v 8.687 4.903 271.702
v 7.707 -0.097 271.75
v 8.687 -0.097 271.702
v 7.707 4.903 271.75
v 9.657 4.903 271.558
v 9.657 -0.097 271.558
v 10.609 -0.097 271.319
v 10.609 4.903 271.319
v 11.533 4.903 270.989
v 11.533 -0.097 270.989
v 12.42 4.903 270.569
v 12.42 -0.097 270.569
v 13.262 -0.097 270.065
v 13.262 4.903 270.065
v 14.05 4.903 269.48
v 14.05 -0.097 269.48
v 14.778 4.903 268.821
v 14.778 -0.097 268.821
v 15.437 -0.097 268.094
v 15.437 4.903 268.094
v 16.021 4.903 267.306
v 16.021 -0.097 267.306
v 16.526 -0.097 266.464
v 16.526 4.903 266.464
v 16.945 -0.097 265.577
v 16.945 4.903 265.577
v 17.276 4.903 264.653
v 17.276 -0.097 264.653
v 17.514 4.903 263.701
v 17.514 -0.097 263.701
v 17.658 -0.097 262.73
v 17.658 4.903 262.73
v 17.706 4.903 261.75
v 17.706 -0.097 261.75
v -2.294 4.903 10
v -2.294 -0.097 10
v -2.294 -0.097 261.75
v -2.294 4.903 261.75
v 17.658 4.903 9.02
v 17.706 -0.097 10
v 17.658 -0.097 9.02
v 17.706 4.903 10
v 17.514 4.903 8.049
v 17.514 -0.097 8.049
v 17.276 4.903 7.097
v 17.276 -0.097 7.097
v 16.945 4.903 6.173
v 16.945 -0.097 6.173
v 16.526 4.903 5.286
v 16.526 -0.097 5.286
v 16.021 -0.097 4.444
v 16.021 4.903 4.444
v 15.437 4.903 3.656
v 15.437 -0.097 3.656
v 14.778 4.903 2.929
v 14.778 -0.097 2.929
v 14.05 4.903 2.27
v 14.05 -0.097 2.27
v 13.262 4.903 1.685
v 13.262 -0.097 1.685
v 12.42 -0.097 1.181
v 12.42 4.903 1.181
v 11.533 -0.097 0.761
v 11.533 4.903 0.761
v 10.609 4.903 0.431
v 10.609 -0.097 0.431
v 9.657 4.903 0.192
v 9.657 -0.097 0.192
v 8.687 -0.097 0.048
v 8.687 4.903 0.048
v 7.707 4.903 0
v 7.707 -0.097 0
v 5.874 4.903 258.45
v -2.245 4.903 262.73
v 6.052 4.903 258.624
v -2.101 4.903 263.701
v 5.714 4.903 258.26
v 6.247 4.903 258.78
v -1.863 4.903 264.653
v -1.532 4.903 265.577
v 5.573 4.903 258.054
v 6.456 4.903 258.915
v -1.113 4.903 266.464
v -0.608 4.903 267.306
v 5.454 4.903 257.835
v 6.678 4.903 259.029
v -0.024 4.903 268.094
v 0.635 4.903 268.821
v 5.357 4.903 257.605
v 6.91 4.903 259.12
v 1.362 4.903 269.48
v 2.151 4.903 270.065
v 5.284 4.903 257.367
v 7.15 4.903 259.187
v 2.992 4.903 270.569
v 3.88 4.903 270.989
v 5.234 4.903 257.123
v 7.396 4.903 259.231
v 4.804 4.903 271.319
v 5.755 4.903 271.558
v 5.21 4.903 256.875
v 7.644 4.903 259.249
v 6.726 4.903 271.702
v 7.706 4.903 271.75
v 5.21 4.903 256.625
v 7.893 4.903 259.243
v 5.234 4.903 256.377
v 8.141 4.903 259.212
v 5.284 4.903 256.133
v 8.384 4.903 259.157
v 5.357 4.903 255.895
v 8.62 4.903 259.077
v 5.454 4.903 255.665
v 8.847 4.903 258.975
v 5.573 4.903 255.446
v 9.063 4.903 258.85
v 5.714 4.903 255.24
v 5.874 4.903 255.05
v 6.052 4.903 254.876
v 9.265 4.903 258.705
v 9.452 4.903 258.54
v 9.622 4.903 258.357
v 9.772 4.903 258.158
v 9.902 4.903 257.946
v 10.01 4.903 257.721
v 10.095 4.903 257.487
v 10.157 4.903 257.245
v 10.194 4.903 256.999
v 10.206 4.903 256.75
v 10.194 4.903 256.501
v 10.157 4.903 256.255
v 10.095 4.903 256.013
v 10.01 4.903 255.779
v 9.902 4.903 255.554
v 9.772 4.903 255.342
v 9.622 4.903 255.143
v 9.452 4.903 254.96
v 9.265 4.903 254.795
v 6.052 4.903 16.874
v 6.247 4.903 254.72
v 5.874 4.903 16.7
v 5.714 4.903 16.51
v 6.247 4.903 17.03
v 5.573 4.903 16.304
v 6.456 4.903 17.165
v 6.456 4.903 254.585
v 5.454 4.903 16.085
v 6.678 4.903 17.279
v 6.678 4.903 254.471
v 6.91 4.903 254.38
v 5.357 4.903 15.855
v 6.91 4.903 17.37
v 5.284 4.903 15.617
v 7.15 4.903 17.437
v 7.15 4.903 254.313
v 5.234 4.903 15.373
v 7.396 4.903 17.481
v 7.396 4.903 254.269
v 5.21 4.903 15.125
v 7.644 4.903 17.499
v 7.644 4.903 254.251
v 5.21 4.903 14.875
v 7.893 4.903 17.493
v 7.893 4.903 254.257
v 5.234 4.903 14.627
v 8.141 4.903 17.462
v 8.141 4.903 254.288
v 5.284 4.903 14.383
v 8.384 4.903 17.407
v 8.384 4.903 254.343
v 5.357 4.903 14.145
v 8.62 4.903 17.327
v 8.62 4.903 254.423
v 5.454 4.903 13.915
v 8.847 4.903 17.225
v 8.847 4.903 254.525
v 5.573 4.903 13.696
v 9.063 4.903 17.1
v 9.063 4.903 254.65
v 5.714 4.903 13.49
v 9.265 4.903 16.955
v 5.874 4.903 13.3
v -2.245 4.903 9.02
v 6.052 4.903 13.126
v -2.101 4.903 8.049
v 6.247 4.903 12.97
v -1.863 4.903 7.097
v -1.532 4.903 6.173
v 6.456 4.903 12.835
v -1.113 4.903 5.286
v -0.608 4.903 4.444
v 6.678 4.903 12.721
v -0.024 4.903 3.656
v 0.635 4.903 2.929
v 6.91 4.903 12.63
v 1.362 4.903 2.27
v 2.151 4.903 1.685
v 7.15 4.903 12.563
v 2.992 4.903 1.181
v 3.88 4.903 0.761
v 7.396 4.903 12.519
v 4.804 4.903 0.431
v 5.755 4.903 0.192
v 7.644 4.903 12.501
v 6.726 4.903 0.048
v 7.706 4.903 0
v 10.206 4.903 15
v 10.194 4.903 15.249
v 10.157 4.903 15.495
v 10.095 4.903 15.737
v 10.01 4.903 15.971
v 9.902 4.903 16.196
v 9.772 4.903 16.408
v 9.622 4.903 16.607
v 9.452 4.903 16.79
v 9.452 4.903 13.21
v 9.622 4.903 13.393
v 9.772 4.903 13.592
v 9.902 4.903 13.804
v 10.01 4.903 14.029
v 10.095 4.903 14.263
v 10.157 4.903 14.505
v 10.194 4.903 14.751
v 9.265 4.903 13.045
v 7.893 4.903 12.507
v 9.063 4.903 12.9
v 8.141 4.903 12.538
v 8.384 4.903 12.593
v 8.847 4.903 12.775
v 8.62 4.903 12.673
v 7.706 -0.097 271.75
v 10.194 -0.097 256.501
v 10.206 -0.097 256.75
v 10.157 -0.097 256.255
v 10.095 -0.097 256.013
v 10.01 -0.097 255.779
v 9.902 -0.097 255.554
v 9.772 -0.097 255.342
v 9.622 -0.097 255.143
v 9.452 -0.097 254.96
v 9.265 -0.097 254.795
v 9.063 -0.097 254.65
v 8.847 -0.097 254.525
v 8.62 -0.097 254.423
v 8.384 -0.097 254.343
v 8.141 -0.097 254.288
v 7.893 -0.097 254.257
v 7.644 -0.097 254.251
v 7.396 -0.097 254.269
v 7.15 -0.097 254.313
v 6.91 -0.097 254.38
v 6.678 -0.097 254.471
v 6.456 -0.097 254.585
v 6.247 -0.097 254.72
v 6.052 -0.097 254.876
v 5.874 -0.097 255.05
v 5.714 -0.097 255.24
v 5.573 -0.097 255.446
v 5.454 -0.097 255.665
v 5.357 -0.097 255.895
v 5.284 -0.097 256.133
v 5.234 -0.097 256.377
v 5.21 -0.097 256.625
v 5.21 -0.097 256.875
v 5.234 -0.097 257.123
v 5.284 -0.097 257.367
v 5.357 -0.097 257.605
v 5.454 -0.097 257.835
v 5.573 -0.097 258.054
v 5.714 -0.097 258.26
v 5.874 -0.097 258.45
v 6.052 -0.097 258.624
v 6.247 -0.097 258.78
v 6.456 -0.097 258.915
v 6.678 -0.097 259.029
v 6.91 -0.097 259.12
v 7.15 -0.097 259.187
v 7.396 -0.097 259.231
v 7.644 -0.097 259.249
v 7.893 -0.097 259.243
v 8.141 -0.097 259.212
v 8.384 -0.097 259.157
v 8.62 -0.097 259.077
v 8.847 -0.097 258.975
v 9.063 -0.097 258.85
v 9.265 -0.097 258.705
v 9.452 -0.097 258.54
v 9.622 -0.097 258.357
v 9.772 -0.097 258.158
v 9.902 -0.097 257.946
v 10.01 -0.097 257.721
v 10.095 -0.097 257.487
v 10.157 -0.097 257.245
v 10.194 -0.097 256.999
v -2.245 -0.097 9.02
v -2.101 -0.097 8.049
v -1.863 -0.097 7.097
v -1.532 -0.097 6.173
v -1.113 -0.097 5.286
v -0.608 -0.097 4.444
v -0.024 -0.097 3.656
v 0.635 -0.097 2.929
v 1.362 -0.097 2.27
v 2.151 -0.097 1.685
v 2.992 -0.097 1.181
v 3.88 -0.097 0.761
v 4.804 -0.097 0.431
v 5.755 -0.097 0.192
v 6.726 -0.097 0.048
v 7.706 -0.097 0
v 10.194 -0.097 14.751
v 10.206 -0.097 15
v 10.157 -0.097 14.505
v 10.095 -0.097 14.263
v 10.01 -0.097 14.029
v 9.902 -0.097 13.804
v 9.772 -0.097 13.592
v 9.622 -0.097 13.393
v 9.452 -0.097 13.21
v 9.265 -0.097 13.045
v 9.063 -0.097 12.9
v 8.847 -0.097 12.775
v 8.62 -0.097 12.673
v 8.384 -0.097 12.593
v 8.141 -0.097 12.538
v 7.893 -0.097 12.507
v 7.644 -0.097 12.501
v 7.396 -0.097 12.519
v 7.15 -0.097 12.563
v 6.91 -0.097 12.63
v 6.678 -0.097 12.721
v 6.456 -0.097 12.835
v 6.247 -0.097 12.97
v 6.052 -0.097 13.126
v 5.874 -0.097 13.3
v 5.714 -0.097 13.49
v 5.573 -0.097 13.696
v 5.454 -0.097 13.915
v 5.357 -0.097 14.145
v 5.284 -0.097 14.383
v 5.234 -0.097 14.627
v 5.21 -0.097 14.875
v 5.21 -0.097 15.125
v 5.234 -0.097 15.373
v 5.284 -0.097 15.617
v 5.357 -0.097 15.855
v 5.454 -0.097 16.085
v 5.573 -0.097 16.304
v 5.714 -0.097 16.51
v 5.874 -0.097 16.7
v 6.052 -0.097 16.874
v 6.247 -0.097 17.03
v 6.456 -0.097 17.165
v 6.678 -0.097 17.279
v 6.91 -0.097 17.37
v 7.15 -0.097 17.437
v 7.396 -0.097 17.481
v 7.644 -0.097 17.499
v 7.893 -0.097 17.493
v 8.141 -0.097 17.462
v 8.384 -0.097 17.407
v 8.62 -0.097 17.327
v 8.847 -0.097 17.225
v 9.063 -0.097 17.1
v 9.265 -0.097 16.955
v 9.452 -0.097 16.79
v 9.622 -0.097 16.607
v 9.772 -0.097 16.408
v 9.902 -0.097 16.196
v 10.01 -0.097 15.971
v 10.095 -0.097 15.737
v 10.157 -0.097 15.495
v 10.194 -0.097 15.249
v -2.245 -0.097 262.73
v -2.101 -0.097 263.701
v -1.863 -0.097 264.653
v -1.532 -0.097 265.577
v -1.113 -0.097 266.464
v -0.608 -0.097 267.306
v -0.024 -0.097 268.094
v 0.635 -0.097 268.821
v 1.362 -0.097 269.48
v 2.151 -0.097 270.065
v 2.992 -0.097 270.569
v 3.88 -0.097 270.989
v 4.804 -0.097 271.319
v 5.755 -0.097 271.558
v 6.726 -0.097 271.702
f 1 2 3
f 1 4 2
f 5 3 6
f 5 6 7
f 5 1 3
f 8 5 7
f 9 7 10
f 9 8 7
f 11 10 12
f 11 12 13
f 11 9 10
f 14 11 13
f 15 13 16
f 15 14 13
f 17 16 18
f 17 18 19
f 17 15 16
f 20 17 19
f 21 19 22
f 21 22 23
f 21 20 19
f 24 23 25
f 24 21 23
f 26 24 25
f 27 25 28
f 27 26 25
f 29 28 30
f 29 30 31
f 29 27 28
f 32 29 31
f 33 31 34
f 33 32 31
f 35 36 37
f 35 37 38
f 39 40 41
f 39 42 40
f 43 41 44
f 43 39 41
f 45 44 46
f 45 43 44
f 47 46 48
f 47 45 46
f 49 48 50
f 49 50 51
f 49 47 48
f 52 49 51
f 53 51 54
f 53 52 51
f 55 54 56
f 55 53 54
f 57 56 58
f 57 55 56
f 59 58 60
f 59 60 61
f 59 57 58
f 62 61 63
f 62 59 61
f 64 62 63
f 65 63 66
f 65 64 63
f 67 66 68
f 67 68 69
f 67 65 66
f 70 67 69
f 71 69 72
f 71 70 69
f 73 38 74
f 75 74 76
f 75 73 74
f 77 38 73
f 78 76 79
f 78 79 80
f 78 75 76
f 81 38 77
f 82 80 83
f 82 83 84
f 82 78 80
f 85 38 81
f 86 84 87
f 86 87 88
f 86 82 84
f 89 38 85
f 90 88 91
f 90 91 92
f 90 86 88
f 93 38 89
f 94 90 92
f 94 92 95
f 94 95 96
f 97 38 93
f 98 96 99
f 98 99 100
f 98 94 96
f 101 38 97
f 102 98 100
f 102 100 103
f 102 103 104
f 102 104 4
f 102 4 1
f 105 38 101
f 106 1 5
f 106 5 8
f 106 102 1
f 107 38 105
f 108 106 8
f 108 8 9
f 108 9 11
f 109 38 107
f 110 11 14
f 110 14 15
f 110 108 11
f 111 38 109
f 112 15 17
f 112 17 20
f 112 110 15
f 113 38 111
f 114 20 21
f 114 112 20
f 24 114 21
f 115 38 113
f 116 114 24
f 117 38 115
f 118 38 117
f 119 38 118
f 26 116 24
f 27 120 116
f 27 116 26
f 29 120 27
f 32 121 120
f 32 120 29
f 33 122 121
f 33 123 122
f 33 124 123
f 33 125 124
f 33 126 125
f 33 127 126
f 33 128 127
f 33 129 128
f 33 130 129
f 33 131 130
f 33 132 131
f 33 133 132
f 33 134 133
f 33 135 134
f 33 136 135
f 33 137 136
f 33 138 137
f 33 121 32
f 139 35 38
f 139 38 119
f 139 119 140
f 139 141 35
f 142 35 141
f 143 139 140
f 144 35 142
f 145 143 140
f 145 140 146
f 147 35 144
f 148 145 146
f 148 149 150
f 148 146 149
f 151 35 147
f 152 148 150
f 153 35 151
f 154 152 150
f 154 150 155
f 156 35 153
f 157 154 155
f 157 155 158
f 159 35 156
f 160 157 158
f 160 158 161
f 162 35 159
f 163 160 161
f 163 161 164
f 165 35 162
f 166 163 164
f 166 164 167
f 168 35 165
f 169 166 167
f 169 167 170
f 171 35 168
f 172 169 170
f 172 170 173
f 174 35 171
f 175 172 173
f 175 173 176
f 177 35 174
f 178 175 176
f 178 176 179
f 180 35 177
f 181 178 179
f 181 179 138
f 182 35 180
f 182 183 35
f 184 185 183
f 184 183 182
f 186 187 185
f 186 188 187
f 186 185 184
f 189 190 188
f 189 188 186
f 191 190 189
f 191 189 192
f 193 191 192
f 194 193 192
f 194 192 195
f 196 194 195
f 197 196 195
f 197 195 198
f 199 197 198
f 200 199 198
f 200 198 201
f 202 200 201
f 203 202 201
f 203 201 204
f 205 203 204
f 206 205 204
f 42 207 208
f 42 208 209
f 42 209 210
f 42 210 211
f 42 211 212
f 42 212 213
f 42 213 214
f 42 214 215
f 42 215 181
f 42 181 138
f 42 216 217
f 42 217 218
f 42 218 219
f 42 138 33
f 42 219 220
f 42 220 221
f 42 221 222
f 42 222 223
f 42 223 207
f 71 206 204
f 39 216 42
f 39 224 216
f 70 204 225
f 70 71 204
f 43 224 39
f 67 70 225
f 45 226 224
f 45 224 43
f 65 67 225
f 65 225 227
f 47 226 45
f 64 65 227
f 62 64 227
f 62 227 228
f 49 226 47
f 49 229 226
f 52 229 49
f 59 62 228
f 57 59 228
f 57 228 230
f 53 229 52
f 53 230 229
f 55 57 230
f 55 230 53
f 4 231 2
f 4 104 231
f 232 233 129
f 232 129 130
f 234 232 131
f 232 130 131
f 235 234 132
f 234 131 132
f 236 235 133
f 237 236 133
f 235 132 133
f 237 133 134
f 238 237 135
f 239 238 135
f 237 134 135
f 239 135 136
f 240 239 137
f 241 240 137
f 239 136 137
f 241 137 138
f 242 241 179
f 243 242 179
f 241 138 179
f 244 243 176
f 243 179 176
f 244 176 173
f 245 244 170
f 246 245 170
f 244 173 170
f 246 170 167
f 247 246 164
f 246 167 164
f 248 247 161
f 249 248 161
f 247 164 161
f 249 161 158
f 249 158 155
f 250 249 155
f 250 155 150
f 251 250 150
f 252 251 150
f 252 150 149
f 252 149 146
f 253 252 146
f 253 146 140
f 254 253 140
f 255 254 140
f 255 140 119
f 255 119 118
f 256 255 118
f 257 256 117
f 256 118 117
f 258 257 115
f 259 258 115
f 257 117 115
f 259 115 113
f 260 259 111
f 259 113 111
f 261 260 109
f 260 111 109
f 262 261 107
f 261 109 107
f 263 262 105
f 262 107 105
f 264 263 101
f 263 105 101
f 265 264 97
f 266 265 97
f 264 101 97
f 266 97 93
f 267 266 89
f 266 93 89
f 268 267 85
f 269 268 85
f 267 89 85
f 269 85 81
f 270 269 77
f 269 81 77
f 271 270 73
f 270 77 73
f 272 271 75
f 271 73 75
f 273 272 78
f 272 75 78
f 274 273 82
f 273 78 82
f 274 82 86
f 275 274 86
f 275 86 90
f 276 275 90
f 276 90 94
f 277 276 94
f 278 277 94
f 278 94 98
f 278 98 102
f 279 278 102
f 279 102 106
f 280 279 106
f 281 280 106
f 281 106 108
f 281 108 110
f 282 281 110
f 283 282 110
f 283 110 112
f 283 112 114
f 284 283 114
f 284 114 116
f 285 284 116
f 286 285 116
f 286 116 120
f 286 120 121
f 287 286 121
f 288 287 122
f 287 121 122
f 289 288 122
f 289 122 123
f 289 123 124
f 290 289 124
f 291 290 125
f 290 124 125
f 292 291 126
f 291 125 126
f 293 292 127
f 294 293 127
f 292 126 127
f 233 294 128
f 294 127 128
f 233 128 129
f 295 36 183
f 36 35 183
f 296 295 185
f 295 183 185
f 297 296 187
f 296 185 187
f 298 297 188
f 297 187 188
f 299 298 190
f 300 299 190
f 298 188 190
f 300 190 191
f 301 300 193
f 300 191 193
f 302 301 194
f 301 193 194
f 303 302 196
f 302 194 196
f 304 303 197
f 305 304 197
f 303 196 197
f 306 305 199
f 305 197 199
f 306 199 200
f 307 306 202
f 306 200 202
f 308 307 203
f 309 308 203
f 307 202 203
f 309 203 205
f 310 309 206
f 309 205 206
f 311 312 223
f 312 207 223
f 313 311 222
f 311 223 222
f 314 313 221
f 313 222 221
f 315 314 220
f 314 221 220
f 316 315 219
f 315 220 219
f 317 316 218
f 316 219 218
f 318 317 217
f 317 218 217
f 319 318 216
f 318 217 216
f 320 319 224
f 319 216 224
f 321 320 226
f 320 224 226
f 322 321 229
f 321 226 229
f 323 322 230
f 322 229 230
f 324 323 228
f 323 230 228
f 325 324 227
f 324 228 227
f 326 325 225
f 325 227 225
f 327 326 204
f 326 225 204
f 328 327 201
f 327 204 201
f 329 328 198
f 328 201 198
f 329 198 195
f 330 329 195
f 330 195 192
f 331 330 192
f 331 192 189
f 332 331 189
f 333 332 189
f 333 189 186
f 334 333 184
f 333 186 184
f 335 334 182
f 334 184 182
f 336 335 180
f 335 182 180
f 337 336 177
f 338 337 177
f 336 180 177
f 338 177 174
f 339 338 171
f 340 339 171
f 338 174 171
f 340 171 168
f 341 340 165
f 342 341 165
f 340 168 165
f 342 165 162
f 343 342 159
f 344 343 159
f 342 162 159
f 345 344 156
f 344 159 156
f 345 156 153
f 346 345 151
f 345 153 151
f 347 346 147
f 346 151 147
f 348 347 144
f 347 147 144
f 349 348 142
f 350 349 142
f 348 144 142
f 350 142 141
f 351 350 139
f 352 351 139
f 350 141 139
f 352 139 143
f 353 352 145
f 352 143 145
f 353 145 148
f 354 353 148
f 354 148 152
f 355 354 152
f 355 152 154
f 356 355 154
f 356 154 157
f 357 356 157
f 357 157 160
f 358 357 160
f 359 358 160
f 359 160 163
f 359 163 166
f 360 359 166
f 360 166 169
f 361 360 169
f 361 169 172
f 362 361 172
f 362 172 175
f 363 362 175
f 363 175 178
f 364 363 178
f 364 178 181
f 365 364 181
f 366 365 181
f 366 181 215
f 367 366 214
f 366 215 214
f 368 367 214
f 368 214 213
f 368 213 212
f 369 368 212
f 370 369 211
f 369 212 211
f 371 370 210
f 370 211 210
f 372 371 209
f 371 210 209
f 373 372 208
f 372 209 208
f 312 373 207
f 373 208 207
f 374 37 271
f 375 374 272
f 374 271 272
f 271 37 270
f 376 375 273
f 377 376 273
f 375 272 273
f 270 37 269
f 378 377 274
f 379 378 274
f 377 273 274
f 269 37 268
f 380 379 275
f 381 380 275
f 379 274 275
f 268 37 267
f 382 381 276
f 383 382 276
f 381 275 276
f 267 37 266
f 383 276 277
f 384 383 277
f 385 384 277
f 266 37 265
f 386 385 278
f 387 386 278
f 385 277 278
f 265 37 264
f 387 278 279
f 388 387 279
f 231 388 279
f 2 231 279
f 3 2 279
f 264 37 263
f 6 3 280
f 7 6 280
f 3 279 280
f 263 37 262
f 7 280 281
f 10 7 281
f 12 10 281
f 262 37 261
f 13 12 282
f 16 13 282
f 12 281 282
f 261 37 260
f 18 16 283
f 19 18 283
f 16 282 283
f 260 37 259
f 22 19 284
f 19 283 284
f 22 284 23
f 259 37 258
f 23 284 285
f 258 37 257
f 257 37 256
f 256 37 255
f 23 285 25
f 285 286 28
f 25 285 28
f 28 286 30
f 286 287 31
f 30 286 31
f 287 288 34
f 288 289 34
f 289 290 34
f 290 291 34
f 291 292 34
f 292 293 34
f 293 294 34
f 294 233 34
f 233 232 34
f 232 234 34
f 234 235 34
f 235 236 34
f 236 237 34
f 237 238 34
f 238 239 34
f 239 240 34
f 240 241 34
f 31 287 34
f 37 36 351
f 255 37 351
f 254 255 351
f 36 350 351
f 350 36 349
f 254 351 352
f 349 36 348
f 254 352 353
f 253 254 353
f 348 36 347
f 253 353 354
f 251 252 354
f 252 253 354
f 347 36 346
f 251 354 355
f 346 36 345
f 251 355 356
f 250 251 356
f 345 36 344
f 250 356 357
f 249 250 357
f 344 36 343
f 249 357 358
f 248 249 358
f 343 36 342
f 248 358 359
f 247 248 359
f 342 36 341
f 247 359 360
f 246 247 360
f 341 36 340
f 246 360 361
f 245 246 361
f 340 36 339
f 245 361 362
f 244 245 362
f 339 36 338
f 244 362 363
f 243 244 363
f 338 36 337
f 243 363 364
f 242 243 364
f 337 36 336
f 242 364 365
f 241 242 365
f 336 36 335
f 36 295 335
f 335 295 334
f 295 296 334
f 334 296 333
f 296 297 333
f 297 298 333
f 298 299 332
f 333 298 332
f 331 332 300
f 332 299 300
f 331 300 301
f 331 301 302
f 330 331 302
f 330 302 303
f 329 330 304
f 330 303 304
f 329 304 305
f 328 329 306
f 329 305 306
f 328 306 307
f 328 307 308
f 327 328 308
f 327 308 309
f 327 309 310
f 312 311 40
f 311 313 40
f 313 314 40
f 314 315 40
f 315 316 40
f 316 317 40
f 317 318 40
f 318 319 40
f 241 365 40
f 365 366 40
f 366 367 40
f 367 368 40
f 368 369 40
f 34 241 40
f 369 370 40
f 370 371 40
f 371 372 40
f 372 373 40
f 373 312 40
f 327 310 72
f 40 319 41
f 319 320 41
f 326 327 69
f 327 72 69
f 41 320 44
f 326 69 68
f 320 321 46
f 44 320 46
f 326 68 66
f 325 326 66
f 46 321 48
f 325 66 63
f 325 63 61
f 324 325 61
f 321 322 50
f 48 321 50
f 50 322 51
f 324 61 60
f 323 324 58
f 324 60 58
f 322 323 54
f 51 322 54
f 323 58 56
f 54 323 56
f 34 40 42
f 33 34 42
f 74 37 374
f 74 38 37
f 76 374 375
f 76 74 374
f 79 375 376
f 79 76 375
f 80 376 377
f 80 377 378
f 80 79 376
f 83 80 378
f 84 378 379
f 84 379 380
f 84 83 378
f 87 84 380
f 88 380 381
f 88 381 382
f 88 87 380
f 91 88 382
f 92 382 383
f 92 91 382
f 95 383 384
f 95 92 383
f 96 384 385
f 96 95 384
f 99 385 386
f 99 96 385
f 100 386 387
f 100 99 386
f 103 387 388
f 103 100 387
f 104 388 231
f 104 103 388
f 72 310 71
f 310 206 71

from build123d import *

# Parameters (mm, degrees)
SKETCH_1_W          = 20
SKETCH_1_H          = 5
EXTRUDE_1_DEPTH     = 271.75
SKETCH_2_R          = 2.5
CUT_EXTRUDE_1_DEPTH = 125.875
FILLET_1_R          = 10


with BuildPart() as part:
    # 草图1 → 凸台-拉伸1 (new body)
    with BuildSketch(Plane.XY):
        with Locations((7.706454687, 2.403044524)):
            Rectangle(SKETCH_1_W, SKETCH_1_H)
    extrude(amount=EXTRUDE_1_DEPTH)

    # 草图2 → 切除-拉伸1 (cut, symmetric)
    with BuildSketch(Plane(origin=(0, 0, 0), x_dir=(1, 0, 0), z_dir=(0, 1, 0))):
        with Locations((7.706454687, -15)):
            Circle(SKETCH_2_R)
        with Locations((7.706454687, -256.75)):
            Circle(SKETCH_2_R)
    extrude(amount=CUT_EXTRUDE_1_DEPTH, both=True, mode=Mode.SUBTRACT)

    # 圆角1
    fillet_1_edges = [part.edges().sort_by_distance(p)[0] for p in [
        (-2.293545313, 2.403044524, 0),
        (17.706454687, 2.403044524, 0),
        (-2.293545313, 2.403044524, 271.75),
        (17.706454687, 2.403044524, 271.75),
    ]]
    fillet(fillet_1_edges, radius=FILLET_1_R - 0.0001)  # a hair under: the kernel refuses the full size


solid = part.part
